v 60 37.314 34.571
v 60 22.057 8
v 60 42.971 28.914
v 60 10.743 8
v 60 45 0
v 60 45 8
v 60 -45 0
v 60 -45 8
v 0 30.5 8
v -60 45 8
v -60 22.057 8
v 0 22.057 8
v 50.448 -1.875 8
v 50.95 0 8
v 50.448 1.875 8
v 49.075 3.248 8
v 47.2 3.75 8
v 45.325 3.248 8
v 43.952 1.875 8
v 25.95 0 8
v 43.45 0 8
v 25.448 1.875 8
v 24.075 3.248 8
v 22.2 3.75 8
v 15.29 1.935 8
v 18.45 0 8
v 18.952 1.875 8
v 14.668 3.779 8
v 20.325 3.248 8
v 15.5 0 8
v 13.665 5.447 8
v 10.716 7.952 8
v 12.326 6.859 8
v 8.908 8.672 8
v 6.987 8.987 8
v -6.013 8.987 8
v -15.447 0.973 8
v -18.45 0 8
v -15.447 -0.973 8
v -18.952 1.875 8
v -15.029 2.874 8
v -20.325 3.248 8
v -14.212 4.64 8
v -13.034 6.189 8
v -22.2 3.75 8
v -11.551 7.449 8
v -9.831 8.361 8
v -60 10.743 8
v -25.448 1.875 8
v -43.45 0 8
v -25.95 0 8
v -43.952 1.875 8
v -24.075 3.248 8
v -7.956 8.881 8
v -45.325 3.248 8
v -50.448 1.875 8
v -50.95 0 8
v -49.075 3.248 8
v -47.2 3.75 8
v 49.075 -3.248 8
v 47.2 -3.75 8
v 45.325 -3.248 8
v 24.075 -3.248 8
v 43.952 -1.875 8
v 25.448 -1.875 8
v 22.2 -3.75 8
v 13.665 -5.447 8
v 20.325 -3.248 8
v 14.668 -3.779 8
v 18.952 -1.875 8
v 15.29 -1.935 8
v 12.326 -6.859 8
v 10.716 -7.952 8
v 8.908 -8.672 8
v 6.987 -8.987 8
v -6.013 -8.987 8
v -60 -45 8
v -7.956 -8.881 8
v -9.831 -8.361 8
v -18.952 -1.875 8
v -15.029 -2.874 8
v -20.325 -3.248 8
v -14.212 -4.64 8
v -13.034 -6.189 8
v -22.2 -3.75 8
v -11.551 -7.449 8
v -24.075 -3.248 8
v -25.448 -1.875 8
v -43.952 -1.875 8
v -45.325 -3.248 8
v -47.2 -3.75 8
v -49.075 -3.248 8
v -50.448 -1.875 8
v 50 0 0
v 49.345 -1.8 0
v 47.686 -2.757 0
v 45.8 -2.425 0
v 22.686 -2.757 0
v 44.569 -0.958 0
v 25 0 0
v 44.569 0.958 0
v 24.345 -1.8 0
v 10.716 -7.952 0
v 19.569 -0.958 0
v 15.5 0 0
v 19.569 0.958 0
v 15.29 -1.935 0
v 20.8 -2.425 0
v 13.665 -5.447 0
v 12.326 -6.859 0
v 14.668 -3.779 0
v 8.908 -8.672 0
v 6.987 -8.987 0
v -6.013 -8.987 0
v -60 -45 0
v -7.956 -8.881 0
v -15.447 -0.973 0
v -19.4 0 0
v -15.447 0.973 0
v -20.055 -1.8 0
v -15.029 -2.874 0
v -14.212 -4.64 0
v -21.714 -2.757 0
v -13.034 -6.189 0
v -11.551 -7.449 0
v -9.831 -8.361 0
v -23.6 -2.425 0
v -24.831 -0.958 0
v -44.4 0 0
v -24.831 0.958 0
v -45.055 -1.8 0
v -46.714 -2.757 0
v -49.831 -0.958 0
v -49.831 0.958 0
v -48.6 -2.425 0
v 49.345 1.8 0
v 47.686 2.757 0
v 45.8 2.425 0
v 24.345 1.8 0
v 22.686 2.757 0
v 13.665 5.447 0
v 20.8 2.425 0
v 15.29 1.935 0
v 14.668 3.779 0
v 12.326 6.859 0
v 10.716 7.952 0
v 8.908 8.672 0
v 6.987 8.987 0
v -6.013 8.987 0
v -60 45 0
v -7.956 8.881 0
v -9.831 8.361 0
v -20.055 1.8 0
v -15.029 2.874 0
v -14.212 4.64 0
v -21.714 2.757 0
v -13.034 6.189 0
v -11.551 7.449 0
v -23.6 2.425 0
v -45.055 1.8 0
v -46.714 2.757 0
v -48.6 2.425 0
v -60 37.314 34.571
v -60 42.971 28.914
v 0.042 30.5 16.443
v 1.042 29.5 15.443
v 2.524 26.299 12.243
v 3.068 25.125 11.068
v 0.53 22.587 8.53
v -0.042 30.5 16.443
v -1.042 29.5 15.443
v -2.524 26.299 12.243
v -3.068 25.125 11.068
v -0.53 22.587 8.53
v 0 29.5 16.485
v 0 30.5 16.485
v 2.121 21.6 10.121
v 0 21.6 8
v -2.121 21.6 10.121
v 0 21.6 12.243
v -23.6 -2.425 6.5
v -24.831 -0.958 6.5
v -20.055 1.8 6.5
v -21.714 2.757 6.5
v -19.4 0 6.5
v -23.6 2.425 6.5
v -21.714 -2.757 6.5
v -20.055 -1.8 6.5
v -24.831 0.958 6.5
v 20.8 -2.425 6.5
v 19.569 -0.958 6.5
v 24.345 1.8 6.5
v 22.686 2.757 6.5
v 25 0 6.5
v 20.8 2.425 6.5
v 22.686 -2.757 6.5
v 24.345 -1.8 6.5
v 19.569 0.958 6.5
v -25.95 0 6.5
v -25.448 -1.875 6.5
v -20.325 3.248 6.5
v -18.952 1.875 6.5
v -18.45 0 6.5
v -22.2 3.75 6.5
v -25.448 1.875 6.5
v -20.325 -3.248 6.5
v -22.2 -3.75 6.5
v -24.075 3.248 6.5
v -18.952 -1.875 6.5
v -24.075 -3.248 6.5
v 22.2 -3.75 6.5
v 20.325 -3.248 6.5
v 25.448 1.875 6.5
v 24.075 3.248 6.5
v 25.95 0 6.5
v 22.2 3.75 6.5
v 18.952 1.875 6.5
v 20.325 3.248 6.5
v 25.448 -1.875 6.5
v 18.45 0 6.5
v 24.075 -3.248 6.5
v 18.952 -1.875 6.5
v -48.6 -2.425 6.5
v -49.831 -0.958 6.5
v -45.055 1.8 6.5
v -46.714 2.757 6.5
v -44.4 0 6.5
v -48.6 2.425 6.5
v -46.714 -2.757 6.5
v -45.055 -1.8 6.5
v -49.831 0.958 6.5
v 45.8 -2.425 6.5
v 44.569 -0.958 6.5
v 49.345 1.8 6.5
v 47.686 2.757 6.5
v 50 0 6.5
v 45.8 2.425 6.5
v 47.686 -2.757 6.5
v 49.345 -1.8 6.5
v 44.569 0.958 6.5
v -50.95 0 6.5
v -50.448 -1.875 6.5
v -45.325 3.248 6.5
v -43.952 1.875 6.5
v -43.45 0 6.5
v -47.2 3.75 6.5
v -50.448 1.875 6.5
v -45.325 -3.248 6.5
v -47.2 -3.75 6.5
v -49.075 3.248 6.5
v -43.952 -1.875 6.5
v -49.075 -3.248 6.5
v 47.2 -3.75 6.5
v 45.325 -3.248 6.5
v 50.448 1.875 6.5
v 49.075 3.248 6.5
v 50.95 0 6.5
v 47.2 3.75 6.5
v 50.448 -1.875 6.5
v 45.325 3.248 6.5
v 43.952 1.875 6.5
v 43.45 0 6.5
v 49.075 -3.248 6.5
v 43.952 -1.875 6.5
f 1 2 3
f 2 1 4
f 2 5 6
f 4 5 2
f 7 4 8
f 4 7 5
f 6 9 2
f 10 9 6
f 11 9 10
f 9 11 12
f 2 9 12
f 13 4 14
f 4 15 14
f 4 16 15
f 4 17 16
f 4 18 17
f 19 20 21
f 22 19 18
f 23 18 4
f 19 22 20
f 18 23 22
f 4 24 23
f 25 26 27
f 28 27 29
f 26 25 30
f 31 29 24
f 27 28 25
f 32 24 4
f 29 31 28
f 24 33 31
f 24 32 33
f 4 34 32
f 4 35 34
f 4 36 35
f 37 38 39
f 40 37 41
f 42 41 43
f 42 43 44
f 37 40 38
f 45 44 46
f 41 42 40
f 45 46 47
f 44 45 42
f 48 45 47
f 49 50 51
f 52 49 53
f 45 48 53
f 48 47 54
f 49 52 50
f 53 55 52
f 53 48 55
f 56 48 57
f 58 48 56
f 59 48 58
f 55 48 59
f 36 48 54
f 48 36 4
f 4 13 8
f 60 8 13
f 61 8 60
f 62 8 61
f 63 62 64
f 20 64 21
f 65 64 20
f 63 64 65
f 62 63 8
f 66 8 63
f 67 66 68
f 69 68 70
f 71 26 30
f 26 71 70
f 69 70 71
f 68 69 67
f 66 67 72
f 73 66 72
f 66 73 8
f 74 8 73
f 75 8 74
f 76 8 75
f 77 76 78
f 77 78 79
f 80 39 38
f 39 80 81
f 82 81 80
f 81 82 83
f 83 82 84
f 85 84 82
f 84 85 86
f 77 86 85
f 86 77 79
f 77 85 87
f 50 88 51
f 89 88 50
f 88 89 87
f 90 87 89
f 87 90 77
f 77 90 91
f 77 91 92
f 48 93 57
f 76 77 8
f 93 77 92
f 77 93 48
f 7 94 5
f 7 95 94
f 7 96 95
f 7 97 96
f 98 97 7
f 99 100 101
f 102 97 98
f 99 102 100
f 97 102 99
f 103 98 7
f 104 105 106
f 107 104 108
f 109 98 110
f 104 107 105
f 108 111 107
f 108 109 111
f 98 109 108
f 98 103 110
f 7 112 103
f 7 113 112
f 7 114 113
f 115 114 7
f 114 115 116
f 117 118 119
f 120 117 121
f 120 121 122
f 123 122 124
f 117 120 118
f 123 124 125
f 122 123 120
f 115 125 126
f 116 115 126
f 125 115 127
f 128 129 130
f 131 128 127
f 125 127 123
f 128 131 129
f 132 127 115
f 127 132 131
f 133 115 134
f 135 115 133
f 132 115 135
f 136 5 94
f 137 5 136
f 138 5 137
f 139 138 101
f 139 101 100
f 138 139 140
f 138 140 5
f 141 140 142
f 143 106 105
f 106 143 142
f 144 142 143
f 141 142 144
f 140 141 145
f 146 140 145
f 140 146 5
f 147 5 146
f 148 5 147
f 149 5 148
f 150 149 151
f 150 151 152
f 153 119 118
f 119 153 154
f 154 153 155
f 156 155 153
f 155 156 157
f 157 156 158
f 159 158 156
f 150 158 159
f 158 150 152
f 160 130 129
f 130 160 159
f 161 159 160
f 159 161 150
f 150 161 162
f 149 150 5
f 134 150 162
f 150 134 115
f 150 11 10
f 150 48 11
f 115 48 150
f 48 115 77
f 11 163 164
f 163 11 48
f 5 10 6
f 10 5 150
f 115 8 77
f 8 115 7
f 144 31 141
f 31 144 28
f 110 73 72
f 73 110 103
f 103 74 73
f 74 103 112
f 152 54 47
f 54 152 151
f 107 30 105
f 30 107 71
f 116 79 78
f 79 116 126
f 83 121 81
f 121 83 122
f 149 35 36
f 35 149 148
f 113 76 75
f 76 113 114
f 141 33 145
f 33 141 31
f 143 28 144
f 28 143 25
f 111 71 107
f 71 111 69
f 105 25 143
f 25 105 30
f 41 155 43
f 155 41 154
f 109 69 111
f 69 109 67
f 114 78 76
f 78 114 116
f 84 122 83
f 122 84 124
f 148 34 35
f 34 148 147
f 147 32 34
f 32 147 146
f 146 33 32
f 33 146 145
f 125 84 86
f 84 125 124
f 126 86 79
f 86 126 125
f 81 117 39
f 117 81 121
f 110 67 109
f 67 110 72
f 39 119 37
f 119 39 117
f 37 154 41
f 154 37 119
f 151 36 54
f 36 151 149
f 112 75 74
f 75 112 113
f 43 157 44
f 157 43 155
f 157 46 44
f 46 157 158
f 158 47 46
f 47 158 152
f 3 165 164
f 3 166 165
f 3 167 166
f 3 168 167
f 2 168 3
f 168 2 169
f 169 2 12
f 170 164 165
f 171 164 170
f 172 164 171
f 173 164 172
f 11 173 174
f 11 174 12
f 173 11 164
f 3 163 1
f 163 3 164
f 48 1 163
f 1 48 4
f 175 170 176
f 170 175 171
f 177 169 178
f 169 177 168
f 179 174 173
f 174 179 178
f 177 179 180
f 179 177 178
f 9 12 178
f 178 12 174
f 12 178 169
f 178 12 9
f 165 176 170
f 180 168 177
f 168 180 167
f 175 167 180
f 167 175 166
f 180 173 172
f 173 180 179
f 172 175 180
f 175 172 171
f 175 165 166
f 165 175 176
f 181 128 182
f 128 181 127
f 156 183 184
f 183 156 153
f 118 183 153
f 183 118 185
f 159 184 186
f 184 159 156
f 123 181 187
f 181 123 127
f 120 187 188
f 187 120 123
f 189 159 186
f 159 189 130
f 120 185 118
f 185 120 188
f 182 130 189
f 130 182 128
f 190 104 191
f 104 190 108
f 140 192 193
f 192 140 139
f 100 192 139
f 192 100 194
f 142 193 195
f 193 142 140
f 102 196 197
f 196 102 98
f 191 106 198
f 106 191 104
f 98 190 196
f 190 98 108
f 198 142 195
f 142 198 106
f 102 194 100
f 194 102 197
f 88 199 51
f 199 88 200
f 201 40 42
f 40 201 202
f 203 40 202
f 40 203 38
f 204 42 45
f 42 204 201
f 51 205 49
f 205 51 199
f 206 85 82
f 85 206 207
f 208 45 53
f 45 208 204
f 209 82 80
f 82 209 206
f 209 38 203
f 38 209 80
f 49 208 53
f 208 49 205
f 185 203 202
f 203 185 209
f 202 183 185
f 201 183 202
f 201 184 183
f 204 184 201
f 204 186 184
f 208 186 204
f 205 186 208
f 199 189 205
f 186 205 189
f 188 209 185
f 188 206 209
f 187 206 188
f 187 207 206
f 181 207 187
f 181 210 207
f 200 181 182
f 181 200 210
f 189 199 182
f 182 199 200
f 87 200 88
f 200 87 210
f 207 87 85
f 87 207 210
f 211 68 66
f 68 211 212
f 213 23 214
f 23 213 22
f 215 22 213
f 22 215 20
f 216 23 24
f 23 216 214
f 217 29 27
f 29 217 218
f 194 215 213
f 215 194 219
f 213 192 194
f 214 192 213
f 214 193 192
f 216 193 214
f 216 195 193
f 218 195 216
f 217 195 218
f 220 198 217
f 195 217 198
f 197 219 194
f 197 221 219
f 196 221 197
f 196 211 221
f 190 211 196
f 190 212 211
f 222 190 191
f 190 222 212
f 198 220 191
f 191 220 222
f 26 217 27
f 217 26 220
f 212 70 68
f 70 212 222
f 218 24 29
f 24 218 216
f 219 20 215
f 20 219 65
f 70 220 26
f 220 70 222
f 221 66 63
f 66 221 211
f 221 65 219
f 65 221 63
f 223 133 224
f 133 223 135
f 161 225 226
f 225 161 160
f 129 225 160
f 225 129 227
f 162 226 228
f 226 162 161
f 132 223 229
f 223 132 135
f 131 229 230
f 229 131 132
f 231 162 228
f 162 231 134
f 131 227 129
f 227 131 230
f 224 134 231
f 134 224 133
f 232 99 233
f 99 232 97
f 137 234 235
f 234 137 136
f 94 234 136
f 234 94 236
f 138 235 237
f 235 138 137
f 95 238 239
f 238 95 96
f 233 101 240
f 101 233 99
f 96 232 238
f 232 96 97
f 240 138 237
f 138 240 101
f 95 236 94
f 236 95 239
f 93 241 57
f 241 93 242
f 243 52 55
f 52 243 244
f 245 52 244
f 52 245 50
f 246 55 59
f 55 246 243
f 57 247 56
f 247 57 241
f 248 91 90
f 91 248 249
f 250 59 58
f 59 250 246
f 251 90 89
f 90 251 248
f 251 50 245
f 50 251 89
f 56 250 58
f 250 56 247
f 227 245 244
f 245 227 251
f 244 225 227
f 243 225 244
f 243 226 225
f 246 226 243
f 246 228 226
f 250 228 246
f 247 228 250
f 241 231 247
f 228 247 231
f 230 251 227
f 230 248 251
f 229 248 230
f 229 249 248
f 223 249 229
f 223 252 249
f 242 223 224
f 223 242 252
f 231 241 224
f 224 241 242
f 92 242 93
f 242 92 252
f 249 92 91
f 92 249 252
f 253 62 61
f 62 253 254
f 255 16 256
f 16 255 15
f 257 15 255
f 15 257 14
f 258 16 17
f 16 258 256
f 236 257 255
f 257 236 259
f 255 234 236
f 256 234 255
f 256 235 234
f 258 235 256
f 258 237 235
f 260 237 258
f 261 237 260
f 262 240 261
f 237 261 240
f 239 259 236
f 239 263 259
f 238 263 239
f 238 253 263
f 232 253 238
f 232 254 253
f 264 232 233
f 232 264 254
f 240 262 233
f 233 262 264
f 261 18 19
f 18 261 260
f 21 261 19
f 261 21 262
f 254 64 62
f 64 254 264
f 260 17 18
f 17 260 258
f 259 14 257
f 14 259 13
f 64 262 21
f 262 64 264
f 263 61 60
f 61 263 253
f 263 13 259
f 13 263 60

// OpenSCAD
/* [Global] */

// Size of the collet you are using in the router
colletsize = 18.0;
// Values above 1 make the domino slot larger
size = 1;
// Width of the material you want to use
materialwidth = 44;

/* [Registration plate] */

// Thickness of the registration plate
regplatethickness = 8;
// Height of the registration plate
regplateheight = 40;
// Rotation of the registration plate
regplaterot = -45;

/* [Base plate] */

// Strength of the base plate
baseplatethickness = 8;
// Width of the baseplate
baseplatewidth = 120;
// Height of the baseplate (set to 0 for automatic calculation)
baseplateheight = 90;

/* [Alignment helpers] */

// Distance of the alignmentpin from the center
alignmentpindistance = 25;
// Diameter of the alignmentpin hole
alignmentpindiameter = 5.6;
// Number of alignmentpins
alignmentpincount = 2; // [0:1:10]
// Diameter of recess for bookshelf pins
recessdiameter=7.5;
// Depth of the pin recess
recess=1.5;


dominowidth = 13 * size;

difference() {

  difference() {

    translate([0,0,baseplatethickness/2]) union() {

      // Baseplate
      difference() {
        cube([baseplatewidth,baseplateheightcalc(),baseplatethickness], center=true);
        hull() {
            translate([-dominowidth/2,0,0]) cylinder(h=2*baseplatethickness, d=colletsize, center=true);
            translate([dominowidth/2,0,0]) cylinder(h=2*baseplatethickness, d=colletsize, center=true);
        }
      }

      // Registration plate
        translate([0,0.5*regplatethickness+0.5*materialwidth,(regplateheight/2)-0.8*regplatethickness])
        rotate(a=regplaterot, v=[1,0,0])
          cube([baseplatewidth,regplatethickness,regplateheight], center=true);

    }

    // Logo
//    translate([0,0.5*materialwidth,0.5*regplateheight+baseplatethickness]) rotate([90,180,0]) union() {
//       scale([logosize(),logosize(),3]) translate([0,0,-0.5])  wow_logo();
//      }


    // Center alignment line
//    rotate([90,0,0])
//      translate([-0.1*baseplatethickness,0,0])
//         linear_extrude(baseplateheightcalc()+2, center=true)
//           polygon(points=[[0,0], [0.5,0.2*baseplatethickness], [1,0]]);

    // Registration plate alignment line
    hull() {
      translate([0,0.5*regplatethickness+0.5*materialwidth,sqrt(3*3+3*3)/2+baseplatethickness])
        rotate([45,0,90])
          cube([1.1*regplatethickness,3,3],center=true);

        translate([0,0.5*materialwidth+regplatethickness,sqrt(6*6+6*6)/2+baseplatethickness])
          rotate([45,0,90])
            cube([1,6,6],center=true);
    }

  }

  // Alignment holes
  if (alignmentpincount > 0) {
    for (i=[1:alignmentpincount]) {
      union() {
        translate([-i*alignmentpindistance+0.5*alignmentpindiameter,0,baseplatethickness/2])
         cylinder(r=alignmentpindiameter/2, h=2*baseplatethickness, center=true);
        translate([i*alignmentpindistance-0.5*alignmentpindiameter,0,baseplatethickness/2])
         cylinder(r=alignmentpindiameter/2, h=2*baseplatethickness, center=true);

       translate([-i*alignmentpindistance+0.5*alignmentpindiameter,0,baseplatethickness-recess/2])
        cylinder(r=recessdiameter/2, h=recess, center=true);
      translate([i*alignmentpindistance-0.5*alignmentpindiameter,0,baseplatethickness-recess/2])
       cylinder(r=recessdiameter/2, h=recess, center=true);

       }
     }
   }
 }



function baseplateheightcalc() = (baseplateheight==0) ? materialwidth + (2*regplatethickness) : baseplateheight ;

function logosize() = (baseplatewidth < regplateheight) ? 0.6*baseplatewidth : 0.6*regplateheight ;


module wow_logo()
{
 /* Generated by trace2scad version 20150415
    http://aggregate.org/MAKE/TRACE2SCAD/
    Optimized model has 607/4417 original points
 */
 minx=0; /* polygon minx=0 */
 miny=0; /* polygon miny=3 */
 maxx=18220; /* polygon maxx=18220 */
 maxy=20000; /* polygon maxy=20000 */
 dx=maxx-minx;
 dy=maxy-miny;
 maxd=((dx>dy)?dx:dy);
 scale([1/maxd, 1/maxd, 1])
 translate([-minx-dx/2, -miny-dy/2, 0])
 linear_extrude(height=1, convexity=607)
 union() {
  union() {
   union() {
    difference() {
     polygon([[14210,19995],[14210,19990],[14075,19974],[14064,19960],[14028,19443],[13970,18717],[13934,18123],[13929,17563],[13975,16413],[14027,15858],[14075,15523],[14158,15158],[14183,15140],[14533,15122],[14618,15113],[15248,15113],[15603,15164],[15818,15221],[15848,15233],[15860,15258],[15932,15778],[15975,16168],[16003,16633],[16020,17074],[16026,17933],[15995,18638],[15968,18904],[15899,19348],[15832,19630],[15739,19908],[15721,19947],[15712,19955],[15405,19962],[14933,19986],[14910,20000],[14210,20000]], convexity=7);
     polygon([[15077,18800],[15084,18795],[15135,18458],[15182,18028],[15200,17843],[15221,17398],[15216,16768],[15203,16534],[15187,16514],[14825,16460],[14800,16471],[14725,16995],[14700,17233],[14685,17388],[14676,17708],[14682,18711],[14701,18735],[14750,18760],[14908,18793],[15049,18808],[15070,18806]], convexity=7);
    }
   }
   polygon([[16790,19970],[16708,19966],[16333,19935],[16320,19918],[16335,18918],[16390,16913],[16410,16268],[16420,15161],[16543,15140],[16978,15128],[17200,15134],[17303,15149],[17346,15164],[17354,15170],[17359,15413],[17340,16138],[17329,16798],[17362,17213],[17380,17344],[17941,17356],[17958,17369],[18010,17648],[18035,17940],[18059,18343],[18045,18358],[17883,18370],[17315,18376],[17302,18389],[17295,18769],[17310,18985],[17336,19074],[17358,19080],[17658,19075],[18065,19052],[18161,19041],[18179,19059],[18195,19181],[18210,19290],[18220,19290],[18220,19928],[17950,19953],[17743,19971],[16873,19974]], convexity=12);
   polygon([[900,19930],[768,19926],[278,19879],[0,19840],[0,19776],[14,19765],[31,19650],[157,18873],[270,18044],[363,17265],[430,16650],[582,15220],[775,13498],[1028,11239],[1053,11221],[1143,11210],[1480,11218],[1618,11227],[1983,11227],[2104,11210],[2119,11224],[2190,11745],[2257,12311],[2372,13408],[2430,13936],[2495,14441],[2500,14460],[2519,14470],[2567,14003],[2612,13620],[2682,13110],[2972,11224],[2984,11211],[3179,11207],[3555,11243],[3883,11280],[4113,11290],[4129,11309],[4245,12553],[4532,15720],[4645,16868],[4758,17920],[4873,18870],[4940,19380],[4995,19769],[4989,19796],[4983,19805],[4828,19835],[4563,19855],[3920,19860],[3785,19872],[3749,19876],[3720,19728],[3697,19545],[3631,18753],[3572,17883],[3503,17080],[3434,16523],[3415,16389],[3392,16356],[3386,16354],[3307,16760],[3285,16903],[3217,17448],[3170,17896],[3045,19170],[3000,19530],[2954,19791],[2935,19813],[2493,19841],[2298,19836],[2176,19809],[2150,19782],[2120,19535],[2075,19073],[2030,18518],[1973,17778],[1927,17213],[1903,16955],[1885,16820],[1881,16814],[1847,17060],[1767,17843],[1677,18654],[1584,19395],[1506,19917],[1490,19932],[1033,19934]], convexity=14);
   polygon([[9653,19895],[9578,19891],[9158,19880],[8863,19852],[8859,19821],[9006,19443],[9211,18828],[9405,18148],[9585,17423],[9815,16373],[9953,15690],[9999,15462],[10033,13923],[10062,12265],[10043,11243],[10064,11218],[10288,11186],[10653,11179],[11193,11198],[11800,11212],[11815,11228],[11855,14883],[11869,15283],[12122,16263],[12930,19398],[13037,19850],[13023,19864],[12898,19880],[12368,19899],[11703,19880],[11625,19710],[11497,19278],[11390,18798],[11198,17863],[11108,17513],[11081,17462],[10977,17795],[10901,18133],[10843,18447],[10775,18880],[10693,19420],[10612,19875],[10598,19889],[10258,19900],[9728,19899]], convexity=11);
   union() {
    difference() {
     polygon([[8053,19870],[8033,19866],[7546,19820],[7013,19793],[5986,19794],[5968,19733],[5842,18843],[5750,18118],[5613,16898],[5455,15301],[5352,14175],[5193,12445],[5065,11172],[5083,11156],[5178,11144],[5603,11136],[6390,11150],[6579,11155],[6599,11173],[6640,11487],[6767,12760],[6790,12950],[6880,13581],[6902,13714],[7312,13723],[7343,13713],[7395,13237],[7440,12683],[7498,11798],[7536,11220],[7549,11209],[7797,11185],[8213,11160],[8633,11154],[9063,11170],[9321,11200],[9372,11215],[9377,11220],[9290,11745],[9153,12633],[9040,13390],[8788,15210],[8662,16145],[8410,17985],[8227,19213],[8119,19875],[8073,19874]], convexity=11);
     polygon([[7219,17983],[7230,17928],[7294,17377],[7511,15737],[7493,15721],[7048,15682],[6904,15671],[6879,15687],[7018,16886],[7106,17513],[7201,18053],[7209,18038]], convexity=7);
    }
   }
   polygon([[17953,14643],[17908,14638],[14628,14631],[14355,14610],[13626,14555],[13614,14528],[13605,13628],[13620,13533],[13631,12723],[13643,12710],[13935,12695],[15223,12669],[16685,12680],[17360,12700],[17790,12730],[18031,12766],[18050,12787],[18075,13211],[18097,14322],[18090,14636],[18079,14650],[17998,14648]], convexity=7);
   union() {
    difference() {
     polygon([[7828,8830],[7723,8826],[7530,8810],[6978,8760],[6525,8708],[6513,8703],[6425,8443],[6299,7953],[6232,7613],[6162,7125],[6115,6598],[6092,6158],[6074,5546],[6084,3793],[6107,3145],[6145,2538],[6218,1908],[6263,1607],[6371,1058],[6457,703],[6607,184],[6631,155],[7138,91],[7398,68],[8103,68],[8518,116],[8933,206],[9153,278],[9220,934],[9267,1515],[9330,2478],[9358,3173],[9383,4028],[9402,4698],[9403,6183],[9368,6740],[9325,7191],[9300,7373],[9260,7641],[9165,8080],[9056,8463],[8938,8776],[8873,8796],[8541,8830],[7933,8833]], convexity=6);
     polygon([[7987,6799],[7994,6788],[8035,6410],[8075,5868],[8100,5203],[8130,2808],[8152,2390],[8114,2363],[7999,2320],[7914,2303],[7514,2293],[7495,2328],[7417,2975],[7372,3455],[7325,4128],[7280,5095],[7260,5748],[7235,6722],[7257,6745],[7430,6775],[7808,6791],[7980,6810]], convexity=6);
    }
   }
   union() {
    difference() {
     polygon([[11625,8830],[11528,8826],[11173,8798],[10725,8753],[10345,8715],[10331,8715],[10302,8691],[10160,8208],[10090,7913],[10020,7540],[9975,7226],[9953,7035],[9930,6797],[9905,6438],[9884,5935],[9878,4888],[9884,3790],[9895,3418],[9918,2955],[9956,2423],[10032,1805],[10134,1228],[10254,708],[10414,169],[10423,160],[10890,95],[11203,68],[11898,68],[12338,120],[12673,191],[12918,266],[12954,281],[13030,1028],[13102,2045],[13125,2448],[13150,2995],[13190,4218],[13208,5603],[13185,6483],[13160,6833],[13137,7075],[13115,7270],[13070,7573],[12975,8043],[12865,8433],[12736,8775],[12718,8789],[12388,8830],[11723,8834]], convexity=8);
     polygon([[11794,6796],[11799,6788],[11813,6634],[11848,6253],[11875,5778],[11890,5493],[11910,4528],[11925,3060],[11948,2398],[11945,2380],[11848,2334],[11730,2304],[11313,2290],[11300,2306],[11253,2663],[11185,3308],[11140,3878],[11115,4305],[11075,5128],[11045,6443],[11043,6731],[11068,6751],[11233,6775],[11608,6791],[11790,6805]], convexity=6);
    }
   }
   polygon([[1633,8785],[1553,8781],[1068,8732],[838,8699],[814,8688],[957,7800],[1003,7495],[1117,6608],[1185,6020],[1323,4730],[1447,3593],[1493,3188],[1837,122],[1844,93],[1864,76],[2076,70],[2625,85],[2773,85],[2915,70],[2929,93],[3010,673],[3080,1270],[3230,2696],[3273,3058],[3316,3352],[3321,3362],[3332,3302],[3355,3082],[3400,2668],[3480,2058],[3642,1010],[3789,73],[3803,64],[4150,75],[4563,123],[4831,144],[4920,146],[4936,164],[4975,546],[5135,2290],[5270,3797],[5443,5605],[5580,6879],[5648,7443],[5693,7801],[5806,8641],[5784,8665],[5663,8690],[5298,8716],[4963,8710],[4620,8725],[4573,8735],[4549,8717],[4500,8338],[4450,7700],[4370,6570],[4302,5833],[4231,5298],[4215,5200],[4211,5194],[4180,5283],[4107,5685],[4041,6183],[3993,6638],[3925,7335],[3825,8301],[3769,8623],[3758,8668],[3403,8696],[3088,8691],[2983,8666],[2966,8643],[2942,8493],[2875,7803],[2760,6334],[2705,5724],[2681,5700],[2588,6615],[2520,7232],[2452,7803],[2383,8343],[2320,8779],[2289,8790],[1713,8788]], convexity=17);
   union() {
    difference() {
     polygon([[14457,8720],[14322,8716],[14025,8683],[13759,8634],[13740,8615],[13810,7398],[13880,6018],[13925,4925],[13965,3688],[13981,2013],[13965,625],[13949,190],[13964,167],[14200,101],[14528,42],[14823,9],[14843,3],[15388,3],[15688,55],[15873,116],[15999,188],[16182,343],[16328,483],[16533,718],[16926,1222],[17175,1513],[17235,1594],[17324,1748],[17374,1868],[17396,1970],[17402,2015],[17383,2490],[17355,3138],[17329,4658],[17315,6600],[17300,7571],[17275,7656],[17212,7773],[17066,7958],[16849,8158],[16558,8380],[16208,8599],[16028,8692],[15488,8699],[15252,8715],[14593,8723]], convexity=8);
     polygon([[15785,6295],[15794,6290],[15867,5806],[15930,5303],[15975,4756],[16001,4197],[15991,3430],[15968,3065],[15923,2638],[15849,2213],[15835,2190],[15780,2198],[15374,2286],[15366,2309],[15328,3430],[15283,4398],[15213,5564],[15169,6210],[15206,6238],[15283,6270],[15433,6299],[15776,6300]], convexity=6);
    }
   }
  }
 }
}
